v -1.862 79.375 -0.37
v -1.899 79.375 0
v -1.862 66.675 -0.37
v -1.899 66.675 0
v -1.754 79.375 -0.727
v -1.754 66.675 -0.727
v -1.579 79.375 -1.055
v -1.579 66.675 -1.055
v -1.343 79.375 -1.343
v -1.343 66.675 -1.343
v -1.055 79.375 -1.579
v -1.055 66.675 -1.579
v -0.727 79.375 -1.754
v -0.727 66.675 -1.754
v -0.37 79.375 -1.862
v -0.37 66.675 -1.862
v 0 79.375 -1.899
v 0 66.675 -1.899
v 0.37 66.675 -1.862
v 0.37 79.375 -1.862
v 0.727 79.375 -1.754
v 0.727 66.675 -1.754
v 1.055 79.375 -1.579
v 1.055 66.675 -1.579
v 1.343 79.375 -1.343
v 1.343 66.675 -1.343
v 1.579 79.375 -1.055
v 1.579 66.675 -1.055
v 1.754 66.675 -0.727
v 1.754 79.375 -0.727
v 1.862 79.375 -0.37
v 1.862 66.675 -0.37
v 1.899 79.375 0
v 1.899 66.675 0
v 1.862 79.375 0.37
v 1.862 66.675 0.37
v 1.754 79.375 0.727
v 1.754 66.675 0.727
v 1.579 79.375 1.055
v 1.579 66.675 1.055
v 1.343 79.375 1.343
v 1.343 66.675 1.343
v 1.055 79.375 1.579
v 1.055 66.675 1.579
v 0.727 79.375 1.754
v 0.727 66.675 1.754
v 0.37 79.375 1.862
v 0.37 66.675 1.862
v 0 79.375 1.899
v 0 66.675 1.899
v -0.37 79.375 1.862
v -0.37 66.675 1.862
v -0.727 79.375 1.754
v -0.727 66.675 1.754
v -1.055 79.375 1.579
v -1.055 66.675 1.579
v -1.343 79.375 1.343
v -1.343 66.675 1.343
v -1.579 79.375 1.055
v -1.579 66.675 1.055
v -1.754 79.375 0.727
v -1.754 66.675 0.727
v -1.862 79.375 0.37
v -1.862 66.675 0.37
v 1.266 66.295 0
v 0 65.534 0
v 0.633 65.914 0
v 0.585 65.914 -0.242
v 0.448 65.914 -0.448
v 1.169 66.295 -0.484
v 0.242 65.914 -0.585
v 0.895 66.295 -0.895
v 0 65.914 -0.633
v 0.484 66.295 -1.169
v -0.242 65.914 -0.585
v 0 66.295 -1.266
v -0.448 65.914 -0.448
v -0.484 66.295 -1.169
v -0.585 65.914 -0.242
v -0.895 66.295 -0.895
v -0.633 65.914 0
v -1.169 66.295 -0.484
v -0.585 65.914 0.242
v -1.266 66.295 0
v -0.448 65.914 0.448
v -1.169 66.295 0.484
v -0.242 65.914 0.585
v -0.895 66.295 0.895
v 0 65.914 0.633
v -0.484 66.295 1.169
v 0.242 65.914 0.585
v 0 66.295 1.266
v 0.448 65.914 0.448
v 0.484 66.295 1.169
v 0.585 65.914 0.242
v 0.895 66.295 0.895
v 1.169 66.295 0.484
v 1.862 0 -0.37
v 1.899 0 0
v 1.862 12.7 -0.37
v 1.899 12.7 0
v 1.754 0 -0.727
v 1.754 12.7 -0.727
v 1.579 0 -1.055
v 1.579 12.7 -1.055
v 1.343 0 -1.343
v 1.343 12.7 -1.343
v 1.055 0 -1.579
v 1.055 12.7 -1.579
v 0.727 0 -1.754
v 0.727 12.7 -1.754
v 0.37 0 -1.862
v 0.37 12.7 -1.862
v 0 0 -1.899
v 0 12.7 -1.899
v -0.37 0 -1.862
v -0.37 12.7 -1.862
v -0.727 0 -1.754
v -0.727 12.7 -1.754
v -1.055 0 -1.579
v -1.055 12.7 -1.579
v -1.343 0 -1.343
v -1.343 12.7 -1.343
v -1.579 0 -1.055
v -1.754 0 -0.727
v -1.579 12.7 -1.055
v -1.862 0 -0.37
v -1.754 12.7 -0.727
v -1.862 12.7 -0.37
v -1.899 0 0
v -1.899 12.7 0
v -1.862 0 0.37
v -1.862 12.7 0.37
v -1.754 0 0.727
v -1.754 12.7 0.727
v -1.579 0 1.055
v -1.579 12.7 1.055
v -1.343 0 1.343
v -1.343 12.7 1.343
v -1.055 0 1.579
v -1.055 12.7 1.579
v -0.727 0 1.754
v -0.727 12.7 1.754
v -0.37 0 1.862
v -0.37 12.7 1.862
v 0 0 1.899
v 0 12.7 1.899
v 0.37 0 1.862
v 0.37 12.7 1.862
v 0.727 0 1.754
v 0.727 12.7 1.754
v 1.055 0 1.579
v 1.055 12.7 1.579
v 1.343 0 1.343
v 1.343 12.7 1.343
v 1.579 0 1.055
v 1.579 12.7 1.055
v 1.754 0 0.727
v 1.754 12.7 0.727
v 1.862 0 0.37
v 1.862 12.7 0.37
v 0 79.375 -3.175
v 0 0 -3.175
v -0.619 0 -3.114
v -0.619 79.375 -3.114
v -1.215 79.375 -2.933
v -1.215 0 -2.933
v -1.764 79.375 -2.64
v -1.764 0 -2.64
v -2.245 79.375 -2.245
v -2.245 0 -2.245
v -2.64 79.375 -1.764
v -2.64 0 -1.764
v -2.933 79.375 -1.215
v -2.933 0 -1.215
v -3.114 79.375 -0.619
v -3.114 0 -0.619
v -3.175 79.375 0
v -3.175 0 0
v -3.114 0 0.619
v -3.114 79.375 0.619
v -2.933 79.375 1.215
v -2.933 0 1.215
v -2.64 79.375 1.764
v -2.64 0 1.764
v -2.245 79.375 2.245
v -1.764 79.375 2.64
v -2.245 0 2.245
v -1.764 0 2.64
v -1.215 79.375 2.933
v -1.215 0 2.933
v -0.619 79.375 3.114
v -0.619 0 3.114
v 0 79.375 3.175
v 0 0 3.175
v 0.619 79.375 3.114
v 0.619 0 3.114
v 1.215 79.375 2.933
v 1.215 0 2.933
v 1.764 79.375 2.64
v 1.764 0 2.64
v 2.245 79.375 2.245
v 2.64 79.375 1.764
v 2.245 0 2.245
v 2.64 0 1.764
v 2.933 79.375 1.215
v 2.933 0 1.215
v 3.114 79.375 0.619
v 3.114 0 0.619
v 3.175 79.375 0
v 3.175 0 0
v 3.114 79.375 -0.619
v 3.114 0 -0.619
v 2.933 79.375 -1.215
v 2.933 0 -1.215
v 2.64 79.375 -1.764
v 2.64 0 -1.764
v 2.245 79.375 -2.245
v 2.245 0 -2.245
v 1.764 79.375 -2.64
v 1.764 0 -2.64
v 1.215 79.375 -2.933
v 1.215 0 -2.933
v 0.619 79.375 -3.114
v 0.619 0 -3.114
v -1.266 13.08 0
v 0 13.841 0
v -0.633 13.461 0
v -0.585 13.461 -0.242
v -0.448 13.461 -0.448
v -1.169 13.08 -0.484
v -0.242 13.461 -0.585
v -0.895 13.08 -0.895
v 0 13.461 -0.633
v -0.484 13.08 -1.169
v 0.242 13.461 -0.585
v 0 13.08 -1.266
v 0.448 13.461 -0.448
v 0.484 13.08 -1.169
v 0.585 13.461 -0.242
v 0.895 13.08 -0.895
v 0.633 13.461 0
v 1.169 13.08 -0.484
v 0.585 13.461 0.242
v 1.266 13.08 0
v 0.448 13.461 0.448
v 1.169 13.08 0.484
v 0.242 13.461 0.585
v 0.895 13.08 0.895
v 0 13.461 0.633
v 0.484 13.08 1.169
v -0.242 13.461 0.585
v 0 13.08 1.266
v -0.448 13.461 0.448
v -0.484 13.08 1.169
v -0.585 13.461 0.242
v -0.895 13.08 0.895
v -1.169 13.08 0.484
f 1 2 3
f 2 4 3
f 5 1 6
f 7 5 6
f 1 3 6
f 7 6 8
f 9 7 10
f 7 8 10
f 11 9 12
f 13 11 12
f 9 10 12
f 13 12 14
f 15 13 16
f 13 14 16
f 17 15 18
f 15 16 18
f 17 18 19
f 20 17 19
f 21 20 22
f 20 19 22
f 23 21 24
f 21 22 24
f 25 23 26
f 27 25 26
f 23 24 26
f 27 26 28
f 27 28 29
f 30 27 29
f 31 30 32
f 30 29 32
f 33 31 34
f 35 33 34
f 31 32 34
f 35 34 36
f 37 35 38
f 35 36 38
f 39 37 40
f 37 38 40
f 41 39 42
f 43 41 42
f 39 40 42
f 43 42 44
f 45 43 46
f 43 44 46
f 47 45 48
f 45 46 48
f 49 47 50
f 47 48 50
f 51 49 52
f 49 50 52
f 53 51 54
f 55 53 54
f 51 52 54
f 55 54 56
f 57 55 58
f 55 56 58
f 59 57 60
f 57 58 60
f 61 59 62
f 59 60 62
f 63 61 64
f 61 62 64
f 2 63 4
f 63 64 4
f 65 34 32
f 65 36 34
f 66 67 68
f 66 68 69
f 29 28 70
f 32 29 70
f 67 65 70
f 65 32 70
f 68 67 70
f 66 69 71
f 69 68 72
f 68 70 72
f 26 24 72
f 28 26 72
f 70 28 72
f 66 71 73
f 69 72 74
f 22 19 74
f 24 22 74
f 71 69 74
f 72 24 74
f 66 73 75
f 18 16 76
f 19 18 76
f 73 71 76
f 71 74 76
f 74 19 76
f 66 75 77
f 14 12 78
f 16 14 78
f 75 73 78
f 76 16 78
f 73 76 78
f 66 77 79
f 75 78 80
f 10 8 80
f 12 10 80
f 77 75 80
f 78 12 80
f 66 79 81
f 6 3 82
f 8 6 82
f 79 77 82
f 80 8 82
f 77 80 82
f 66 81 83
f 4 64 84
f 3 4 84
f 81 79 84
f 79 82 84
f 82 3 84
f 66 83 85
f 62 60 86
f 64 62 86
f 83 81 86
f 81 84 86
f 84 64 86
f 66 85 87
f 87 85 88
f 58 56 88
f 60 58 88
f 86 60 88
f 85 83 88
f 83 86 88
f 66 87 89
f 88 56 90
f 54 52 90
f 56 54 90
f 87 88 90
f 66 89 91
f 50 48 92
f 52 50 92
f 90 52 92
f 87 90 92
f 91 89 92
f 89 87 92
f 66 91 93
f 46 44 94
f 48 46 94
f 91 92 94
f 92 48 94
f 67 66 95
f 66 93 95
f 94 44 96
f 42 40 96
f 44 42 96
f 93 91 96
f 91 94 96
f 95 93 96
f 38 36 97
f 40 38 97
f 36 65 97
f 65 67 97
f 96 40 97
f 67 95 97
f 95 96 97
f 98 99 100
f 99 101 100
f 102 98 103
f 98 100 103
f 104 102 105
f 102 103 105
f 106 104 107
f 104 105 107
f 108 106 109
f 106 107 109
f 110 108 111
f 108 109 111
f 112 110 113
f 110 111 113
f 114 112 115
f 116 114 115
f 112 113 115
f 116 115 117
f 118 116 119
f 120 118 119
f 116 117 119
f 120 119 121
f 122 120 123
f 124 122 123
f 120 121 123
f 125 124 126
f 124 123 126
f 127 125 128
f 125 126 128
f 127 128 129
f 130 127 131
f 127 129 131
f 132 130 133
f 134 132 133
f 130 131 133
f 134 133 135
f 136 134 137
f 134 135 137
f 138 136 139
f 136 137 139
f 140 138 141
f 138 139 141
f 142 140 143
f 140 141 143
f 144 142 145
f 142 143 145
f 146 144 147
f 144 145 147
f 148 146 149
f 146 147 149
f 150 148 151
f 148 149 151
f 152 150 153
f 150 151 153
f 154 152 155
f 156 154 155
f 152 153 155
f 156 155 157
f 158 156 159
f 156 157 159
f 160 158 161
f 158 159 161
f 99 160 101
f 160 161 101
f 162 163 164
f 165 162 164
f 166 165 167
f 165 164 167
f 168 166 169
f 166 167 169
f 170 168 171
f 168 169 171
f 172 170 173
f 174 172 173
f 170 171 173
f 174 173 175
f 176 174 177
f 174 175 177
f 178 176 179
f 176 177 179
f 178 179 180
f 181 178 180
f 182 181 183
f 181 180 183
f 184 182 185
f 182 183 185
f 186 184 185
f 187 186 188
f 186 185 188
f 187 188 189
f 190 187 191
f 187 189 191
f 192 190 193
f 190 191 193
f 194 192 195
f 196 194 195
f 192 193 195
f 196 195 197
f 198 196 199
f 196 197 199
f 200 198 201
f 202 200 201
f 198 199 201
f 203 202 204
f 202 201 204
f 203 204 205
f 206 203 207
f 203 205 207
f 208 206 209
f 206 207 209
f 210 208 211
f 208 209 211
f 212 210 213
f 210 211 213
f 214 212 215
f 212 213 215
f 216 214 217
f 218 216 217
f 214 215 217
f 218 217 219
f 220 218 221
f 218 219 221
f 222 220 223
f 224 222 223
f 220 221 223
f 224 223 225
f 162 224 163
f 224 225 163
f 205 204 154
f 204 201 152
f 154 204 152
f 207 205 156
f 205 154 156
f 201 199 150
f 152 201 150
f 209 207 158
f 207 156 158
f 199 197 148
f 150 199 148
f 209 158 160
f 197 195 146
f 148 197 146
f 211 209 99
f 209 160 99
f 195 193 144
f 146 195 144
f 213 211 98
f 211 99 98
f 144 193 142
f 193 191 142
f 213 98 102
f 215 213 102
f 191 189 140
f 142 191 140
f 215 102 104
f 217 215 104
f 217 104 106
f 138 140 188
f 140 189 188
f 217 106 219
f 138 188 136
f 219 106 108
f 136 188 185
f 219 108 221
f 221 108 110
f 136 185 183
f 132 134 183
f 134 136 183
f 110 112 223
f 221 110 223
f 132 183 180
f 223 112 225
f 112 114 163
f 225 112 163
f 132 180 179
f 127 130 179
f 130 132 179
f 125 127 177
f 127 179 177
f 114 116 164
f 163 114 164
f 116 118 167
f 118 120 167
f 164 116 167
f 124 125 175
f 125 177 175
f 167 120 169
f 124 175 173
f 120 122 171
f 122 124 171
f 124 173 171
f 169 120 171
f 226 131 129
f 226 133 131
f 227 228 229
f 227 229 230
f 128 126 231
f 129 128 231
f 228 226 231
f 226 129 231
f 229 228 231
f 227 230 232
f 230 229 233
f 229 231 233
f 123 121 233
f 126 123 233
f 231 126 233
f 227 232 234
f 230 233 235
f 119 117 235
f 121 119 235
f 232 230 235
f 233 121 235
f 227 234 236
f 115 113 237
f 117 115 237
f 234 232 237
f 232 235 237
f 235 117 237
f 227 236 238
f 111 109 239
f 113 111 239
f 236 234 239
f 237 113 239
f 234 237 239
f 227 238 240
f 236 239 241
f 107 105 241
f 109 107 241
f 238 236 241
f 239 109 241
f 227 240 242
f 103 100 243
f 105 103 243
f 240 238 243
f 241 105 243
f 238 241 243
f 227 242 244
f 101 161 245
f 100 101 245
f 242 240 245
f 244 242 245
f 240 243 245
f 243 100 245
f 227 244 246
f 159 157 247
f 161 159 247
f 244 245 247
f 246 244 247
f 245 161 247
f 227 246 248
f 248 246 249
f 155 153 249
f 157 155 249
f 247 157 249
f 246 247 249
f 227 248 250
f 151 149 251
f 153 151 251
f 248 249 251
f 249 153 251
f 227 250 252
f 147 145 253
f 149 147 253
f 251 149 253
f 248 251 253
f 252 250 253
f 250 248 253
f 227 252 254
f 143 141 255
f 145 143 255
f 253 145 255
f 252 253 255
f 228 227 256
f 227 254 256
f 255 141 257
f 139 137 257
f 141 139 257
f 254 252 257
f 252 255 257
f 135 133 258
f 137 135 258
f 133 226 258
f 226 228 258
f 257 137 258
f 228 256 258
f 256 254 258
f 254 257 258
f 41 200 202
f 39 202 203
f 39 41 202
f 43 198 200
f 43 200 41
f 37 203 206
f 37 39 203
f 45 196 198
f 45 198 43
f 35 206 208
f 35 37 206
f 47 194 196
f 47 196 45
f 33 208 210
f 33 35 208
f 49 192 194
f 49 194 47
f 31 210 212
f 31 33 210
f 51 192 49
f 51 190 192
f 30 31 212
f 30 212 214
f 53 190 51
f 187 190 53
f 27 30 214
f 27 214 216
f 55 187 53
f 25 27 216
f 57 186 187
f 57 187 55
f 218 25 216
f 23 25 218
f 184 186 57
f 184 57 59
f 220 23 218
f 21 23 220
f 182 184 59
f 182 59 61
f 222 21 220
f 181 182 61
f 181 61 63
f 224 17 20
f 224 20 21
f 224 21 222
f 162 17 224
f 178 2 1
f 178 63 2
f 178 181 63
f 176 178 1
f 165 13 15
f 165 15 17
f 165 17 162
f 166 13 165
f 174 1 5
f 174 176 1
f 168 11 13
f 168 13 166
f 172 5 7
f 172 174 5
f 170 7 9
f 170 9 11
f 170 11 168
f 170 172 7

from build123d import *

# Parameters (mm, degrees)
SKETCH1_R              = 3.175
BOSS_EXTRUDE1_DEPTH    = 79.375
ATTACHHMENT_HOLE_D     = 3.7973
ATTACHHMENT_HOLE_DEPTH = 12.7
ATTACHHMENT_HOLE_TIP   = 1.140824014
F_10_24_TAPPED_D       = 3.7973
F_10_24_TAPPED_DEPTH   = 12.7
F_10_24_TAPPED_TIP     = 1.140824014


with BuildPart() as part:
    # Sketch1 → Boss-Extrude1 (new body)
    with BuildSketch(Plane(origin=(0, 0, 0), x_dir=(1, 0, 0), z_dir=(0, 1, 0))):
        with Locations(Location((0, 0, 0), (0, 0, 90))):
            Circle(SKETCH1_R)
    extrude(amount=BOSS_EXTRUDE1_DEPTH)

    # Attachhment Hole
    with Locations(Plane(origin=(0, 79.375, 0), x_dir=(1, 0, 0), z_dir=(0, 1, 0))):
        with Locations((0, 0)):
            Hole(ATTACHHMENT_HOLE_D / 2, depth=ATTACHHMENT_HOLE_DEPTH)
            with Locations((0, 0, -(ATTACHHMENT_HOLE_DEPTH + ATTACHHMENT_HOLE_TIP / 2))):  # 118° drill point
                Cone(0, ATTACHHMENT_HOLE_D / 2, ATTACHHMENT_HOLE_TIP, mode=Mode.SUBTRACT)

    # #10-24 Tapped
    with Locations(Plane(origin=(0, 0, 0), x_dir=(-1, 0, 0), z_dir=(0, -1, 0))):
        with Locations((0, 0)):
            Hole(F_10_24_TAPPED_D / 2, depth=F_10_24_TAPPED_DEPTH)
            with Locations((0, 0, -(F_10_24_TAPPED_DEPTH + F_10_24_TAPPED_TIP / 2))):  # 118° drill point
                Cone(0, F_10_24_TAPPED_D / 2, F_10_24_TAPPED_TIP, mode=Mode.SUBTRACT)


solid = part.part
